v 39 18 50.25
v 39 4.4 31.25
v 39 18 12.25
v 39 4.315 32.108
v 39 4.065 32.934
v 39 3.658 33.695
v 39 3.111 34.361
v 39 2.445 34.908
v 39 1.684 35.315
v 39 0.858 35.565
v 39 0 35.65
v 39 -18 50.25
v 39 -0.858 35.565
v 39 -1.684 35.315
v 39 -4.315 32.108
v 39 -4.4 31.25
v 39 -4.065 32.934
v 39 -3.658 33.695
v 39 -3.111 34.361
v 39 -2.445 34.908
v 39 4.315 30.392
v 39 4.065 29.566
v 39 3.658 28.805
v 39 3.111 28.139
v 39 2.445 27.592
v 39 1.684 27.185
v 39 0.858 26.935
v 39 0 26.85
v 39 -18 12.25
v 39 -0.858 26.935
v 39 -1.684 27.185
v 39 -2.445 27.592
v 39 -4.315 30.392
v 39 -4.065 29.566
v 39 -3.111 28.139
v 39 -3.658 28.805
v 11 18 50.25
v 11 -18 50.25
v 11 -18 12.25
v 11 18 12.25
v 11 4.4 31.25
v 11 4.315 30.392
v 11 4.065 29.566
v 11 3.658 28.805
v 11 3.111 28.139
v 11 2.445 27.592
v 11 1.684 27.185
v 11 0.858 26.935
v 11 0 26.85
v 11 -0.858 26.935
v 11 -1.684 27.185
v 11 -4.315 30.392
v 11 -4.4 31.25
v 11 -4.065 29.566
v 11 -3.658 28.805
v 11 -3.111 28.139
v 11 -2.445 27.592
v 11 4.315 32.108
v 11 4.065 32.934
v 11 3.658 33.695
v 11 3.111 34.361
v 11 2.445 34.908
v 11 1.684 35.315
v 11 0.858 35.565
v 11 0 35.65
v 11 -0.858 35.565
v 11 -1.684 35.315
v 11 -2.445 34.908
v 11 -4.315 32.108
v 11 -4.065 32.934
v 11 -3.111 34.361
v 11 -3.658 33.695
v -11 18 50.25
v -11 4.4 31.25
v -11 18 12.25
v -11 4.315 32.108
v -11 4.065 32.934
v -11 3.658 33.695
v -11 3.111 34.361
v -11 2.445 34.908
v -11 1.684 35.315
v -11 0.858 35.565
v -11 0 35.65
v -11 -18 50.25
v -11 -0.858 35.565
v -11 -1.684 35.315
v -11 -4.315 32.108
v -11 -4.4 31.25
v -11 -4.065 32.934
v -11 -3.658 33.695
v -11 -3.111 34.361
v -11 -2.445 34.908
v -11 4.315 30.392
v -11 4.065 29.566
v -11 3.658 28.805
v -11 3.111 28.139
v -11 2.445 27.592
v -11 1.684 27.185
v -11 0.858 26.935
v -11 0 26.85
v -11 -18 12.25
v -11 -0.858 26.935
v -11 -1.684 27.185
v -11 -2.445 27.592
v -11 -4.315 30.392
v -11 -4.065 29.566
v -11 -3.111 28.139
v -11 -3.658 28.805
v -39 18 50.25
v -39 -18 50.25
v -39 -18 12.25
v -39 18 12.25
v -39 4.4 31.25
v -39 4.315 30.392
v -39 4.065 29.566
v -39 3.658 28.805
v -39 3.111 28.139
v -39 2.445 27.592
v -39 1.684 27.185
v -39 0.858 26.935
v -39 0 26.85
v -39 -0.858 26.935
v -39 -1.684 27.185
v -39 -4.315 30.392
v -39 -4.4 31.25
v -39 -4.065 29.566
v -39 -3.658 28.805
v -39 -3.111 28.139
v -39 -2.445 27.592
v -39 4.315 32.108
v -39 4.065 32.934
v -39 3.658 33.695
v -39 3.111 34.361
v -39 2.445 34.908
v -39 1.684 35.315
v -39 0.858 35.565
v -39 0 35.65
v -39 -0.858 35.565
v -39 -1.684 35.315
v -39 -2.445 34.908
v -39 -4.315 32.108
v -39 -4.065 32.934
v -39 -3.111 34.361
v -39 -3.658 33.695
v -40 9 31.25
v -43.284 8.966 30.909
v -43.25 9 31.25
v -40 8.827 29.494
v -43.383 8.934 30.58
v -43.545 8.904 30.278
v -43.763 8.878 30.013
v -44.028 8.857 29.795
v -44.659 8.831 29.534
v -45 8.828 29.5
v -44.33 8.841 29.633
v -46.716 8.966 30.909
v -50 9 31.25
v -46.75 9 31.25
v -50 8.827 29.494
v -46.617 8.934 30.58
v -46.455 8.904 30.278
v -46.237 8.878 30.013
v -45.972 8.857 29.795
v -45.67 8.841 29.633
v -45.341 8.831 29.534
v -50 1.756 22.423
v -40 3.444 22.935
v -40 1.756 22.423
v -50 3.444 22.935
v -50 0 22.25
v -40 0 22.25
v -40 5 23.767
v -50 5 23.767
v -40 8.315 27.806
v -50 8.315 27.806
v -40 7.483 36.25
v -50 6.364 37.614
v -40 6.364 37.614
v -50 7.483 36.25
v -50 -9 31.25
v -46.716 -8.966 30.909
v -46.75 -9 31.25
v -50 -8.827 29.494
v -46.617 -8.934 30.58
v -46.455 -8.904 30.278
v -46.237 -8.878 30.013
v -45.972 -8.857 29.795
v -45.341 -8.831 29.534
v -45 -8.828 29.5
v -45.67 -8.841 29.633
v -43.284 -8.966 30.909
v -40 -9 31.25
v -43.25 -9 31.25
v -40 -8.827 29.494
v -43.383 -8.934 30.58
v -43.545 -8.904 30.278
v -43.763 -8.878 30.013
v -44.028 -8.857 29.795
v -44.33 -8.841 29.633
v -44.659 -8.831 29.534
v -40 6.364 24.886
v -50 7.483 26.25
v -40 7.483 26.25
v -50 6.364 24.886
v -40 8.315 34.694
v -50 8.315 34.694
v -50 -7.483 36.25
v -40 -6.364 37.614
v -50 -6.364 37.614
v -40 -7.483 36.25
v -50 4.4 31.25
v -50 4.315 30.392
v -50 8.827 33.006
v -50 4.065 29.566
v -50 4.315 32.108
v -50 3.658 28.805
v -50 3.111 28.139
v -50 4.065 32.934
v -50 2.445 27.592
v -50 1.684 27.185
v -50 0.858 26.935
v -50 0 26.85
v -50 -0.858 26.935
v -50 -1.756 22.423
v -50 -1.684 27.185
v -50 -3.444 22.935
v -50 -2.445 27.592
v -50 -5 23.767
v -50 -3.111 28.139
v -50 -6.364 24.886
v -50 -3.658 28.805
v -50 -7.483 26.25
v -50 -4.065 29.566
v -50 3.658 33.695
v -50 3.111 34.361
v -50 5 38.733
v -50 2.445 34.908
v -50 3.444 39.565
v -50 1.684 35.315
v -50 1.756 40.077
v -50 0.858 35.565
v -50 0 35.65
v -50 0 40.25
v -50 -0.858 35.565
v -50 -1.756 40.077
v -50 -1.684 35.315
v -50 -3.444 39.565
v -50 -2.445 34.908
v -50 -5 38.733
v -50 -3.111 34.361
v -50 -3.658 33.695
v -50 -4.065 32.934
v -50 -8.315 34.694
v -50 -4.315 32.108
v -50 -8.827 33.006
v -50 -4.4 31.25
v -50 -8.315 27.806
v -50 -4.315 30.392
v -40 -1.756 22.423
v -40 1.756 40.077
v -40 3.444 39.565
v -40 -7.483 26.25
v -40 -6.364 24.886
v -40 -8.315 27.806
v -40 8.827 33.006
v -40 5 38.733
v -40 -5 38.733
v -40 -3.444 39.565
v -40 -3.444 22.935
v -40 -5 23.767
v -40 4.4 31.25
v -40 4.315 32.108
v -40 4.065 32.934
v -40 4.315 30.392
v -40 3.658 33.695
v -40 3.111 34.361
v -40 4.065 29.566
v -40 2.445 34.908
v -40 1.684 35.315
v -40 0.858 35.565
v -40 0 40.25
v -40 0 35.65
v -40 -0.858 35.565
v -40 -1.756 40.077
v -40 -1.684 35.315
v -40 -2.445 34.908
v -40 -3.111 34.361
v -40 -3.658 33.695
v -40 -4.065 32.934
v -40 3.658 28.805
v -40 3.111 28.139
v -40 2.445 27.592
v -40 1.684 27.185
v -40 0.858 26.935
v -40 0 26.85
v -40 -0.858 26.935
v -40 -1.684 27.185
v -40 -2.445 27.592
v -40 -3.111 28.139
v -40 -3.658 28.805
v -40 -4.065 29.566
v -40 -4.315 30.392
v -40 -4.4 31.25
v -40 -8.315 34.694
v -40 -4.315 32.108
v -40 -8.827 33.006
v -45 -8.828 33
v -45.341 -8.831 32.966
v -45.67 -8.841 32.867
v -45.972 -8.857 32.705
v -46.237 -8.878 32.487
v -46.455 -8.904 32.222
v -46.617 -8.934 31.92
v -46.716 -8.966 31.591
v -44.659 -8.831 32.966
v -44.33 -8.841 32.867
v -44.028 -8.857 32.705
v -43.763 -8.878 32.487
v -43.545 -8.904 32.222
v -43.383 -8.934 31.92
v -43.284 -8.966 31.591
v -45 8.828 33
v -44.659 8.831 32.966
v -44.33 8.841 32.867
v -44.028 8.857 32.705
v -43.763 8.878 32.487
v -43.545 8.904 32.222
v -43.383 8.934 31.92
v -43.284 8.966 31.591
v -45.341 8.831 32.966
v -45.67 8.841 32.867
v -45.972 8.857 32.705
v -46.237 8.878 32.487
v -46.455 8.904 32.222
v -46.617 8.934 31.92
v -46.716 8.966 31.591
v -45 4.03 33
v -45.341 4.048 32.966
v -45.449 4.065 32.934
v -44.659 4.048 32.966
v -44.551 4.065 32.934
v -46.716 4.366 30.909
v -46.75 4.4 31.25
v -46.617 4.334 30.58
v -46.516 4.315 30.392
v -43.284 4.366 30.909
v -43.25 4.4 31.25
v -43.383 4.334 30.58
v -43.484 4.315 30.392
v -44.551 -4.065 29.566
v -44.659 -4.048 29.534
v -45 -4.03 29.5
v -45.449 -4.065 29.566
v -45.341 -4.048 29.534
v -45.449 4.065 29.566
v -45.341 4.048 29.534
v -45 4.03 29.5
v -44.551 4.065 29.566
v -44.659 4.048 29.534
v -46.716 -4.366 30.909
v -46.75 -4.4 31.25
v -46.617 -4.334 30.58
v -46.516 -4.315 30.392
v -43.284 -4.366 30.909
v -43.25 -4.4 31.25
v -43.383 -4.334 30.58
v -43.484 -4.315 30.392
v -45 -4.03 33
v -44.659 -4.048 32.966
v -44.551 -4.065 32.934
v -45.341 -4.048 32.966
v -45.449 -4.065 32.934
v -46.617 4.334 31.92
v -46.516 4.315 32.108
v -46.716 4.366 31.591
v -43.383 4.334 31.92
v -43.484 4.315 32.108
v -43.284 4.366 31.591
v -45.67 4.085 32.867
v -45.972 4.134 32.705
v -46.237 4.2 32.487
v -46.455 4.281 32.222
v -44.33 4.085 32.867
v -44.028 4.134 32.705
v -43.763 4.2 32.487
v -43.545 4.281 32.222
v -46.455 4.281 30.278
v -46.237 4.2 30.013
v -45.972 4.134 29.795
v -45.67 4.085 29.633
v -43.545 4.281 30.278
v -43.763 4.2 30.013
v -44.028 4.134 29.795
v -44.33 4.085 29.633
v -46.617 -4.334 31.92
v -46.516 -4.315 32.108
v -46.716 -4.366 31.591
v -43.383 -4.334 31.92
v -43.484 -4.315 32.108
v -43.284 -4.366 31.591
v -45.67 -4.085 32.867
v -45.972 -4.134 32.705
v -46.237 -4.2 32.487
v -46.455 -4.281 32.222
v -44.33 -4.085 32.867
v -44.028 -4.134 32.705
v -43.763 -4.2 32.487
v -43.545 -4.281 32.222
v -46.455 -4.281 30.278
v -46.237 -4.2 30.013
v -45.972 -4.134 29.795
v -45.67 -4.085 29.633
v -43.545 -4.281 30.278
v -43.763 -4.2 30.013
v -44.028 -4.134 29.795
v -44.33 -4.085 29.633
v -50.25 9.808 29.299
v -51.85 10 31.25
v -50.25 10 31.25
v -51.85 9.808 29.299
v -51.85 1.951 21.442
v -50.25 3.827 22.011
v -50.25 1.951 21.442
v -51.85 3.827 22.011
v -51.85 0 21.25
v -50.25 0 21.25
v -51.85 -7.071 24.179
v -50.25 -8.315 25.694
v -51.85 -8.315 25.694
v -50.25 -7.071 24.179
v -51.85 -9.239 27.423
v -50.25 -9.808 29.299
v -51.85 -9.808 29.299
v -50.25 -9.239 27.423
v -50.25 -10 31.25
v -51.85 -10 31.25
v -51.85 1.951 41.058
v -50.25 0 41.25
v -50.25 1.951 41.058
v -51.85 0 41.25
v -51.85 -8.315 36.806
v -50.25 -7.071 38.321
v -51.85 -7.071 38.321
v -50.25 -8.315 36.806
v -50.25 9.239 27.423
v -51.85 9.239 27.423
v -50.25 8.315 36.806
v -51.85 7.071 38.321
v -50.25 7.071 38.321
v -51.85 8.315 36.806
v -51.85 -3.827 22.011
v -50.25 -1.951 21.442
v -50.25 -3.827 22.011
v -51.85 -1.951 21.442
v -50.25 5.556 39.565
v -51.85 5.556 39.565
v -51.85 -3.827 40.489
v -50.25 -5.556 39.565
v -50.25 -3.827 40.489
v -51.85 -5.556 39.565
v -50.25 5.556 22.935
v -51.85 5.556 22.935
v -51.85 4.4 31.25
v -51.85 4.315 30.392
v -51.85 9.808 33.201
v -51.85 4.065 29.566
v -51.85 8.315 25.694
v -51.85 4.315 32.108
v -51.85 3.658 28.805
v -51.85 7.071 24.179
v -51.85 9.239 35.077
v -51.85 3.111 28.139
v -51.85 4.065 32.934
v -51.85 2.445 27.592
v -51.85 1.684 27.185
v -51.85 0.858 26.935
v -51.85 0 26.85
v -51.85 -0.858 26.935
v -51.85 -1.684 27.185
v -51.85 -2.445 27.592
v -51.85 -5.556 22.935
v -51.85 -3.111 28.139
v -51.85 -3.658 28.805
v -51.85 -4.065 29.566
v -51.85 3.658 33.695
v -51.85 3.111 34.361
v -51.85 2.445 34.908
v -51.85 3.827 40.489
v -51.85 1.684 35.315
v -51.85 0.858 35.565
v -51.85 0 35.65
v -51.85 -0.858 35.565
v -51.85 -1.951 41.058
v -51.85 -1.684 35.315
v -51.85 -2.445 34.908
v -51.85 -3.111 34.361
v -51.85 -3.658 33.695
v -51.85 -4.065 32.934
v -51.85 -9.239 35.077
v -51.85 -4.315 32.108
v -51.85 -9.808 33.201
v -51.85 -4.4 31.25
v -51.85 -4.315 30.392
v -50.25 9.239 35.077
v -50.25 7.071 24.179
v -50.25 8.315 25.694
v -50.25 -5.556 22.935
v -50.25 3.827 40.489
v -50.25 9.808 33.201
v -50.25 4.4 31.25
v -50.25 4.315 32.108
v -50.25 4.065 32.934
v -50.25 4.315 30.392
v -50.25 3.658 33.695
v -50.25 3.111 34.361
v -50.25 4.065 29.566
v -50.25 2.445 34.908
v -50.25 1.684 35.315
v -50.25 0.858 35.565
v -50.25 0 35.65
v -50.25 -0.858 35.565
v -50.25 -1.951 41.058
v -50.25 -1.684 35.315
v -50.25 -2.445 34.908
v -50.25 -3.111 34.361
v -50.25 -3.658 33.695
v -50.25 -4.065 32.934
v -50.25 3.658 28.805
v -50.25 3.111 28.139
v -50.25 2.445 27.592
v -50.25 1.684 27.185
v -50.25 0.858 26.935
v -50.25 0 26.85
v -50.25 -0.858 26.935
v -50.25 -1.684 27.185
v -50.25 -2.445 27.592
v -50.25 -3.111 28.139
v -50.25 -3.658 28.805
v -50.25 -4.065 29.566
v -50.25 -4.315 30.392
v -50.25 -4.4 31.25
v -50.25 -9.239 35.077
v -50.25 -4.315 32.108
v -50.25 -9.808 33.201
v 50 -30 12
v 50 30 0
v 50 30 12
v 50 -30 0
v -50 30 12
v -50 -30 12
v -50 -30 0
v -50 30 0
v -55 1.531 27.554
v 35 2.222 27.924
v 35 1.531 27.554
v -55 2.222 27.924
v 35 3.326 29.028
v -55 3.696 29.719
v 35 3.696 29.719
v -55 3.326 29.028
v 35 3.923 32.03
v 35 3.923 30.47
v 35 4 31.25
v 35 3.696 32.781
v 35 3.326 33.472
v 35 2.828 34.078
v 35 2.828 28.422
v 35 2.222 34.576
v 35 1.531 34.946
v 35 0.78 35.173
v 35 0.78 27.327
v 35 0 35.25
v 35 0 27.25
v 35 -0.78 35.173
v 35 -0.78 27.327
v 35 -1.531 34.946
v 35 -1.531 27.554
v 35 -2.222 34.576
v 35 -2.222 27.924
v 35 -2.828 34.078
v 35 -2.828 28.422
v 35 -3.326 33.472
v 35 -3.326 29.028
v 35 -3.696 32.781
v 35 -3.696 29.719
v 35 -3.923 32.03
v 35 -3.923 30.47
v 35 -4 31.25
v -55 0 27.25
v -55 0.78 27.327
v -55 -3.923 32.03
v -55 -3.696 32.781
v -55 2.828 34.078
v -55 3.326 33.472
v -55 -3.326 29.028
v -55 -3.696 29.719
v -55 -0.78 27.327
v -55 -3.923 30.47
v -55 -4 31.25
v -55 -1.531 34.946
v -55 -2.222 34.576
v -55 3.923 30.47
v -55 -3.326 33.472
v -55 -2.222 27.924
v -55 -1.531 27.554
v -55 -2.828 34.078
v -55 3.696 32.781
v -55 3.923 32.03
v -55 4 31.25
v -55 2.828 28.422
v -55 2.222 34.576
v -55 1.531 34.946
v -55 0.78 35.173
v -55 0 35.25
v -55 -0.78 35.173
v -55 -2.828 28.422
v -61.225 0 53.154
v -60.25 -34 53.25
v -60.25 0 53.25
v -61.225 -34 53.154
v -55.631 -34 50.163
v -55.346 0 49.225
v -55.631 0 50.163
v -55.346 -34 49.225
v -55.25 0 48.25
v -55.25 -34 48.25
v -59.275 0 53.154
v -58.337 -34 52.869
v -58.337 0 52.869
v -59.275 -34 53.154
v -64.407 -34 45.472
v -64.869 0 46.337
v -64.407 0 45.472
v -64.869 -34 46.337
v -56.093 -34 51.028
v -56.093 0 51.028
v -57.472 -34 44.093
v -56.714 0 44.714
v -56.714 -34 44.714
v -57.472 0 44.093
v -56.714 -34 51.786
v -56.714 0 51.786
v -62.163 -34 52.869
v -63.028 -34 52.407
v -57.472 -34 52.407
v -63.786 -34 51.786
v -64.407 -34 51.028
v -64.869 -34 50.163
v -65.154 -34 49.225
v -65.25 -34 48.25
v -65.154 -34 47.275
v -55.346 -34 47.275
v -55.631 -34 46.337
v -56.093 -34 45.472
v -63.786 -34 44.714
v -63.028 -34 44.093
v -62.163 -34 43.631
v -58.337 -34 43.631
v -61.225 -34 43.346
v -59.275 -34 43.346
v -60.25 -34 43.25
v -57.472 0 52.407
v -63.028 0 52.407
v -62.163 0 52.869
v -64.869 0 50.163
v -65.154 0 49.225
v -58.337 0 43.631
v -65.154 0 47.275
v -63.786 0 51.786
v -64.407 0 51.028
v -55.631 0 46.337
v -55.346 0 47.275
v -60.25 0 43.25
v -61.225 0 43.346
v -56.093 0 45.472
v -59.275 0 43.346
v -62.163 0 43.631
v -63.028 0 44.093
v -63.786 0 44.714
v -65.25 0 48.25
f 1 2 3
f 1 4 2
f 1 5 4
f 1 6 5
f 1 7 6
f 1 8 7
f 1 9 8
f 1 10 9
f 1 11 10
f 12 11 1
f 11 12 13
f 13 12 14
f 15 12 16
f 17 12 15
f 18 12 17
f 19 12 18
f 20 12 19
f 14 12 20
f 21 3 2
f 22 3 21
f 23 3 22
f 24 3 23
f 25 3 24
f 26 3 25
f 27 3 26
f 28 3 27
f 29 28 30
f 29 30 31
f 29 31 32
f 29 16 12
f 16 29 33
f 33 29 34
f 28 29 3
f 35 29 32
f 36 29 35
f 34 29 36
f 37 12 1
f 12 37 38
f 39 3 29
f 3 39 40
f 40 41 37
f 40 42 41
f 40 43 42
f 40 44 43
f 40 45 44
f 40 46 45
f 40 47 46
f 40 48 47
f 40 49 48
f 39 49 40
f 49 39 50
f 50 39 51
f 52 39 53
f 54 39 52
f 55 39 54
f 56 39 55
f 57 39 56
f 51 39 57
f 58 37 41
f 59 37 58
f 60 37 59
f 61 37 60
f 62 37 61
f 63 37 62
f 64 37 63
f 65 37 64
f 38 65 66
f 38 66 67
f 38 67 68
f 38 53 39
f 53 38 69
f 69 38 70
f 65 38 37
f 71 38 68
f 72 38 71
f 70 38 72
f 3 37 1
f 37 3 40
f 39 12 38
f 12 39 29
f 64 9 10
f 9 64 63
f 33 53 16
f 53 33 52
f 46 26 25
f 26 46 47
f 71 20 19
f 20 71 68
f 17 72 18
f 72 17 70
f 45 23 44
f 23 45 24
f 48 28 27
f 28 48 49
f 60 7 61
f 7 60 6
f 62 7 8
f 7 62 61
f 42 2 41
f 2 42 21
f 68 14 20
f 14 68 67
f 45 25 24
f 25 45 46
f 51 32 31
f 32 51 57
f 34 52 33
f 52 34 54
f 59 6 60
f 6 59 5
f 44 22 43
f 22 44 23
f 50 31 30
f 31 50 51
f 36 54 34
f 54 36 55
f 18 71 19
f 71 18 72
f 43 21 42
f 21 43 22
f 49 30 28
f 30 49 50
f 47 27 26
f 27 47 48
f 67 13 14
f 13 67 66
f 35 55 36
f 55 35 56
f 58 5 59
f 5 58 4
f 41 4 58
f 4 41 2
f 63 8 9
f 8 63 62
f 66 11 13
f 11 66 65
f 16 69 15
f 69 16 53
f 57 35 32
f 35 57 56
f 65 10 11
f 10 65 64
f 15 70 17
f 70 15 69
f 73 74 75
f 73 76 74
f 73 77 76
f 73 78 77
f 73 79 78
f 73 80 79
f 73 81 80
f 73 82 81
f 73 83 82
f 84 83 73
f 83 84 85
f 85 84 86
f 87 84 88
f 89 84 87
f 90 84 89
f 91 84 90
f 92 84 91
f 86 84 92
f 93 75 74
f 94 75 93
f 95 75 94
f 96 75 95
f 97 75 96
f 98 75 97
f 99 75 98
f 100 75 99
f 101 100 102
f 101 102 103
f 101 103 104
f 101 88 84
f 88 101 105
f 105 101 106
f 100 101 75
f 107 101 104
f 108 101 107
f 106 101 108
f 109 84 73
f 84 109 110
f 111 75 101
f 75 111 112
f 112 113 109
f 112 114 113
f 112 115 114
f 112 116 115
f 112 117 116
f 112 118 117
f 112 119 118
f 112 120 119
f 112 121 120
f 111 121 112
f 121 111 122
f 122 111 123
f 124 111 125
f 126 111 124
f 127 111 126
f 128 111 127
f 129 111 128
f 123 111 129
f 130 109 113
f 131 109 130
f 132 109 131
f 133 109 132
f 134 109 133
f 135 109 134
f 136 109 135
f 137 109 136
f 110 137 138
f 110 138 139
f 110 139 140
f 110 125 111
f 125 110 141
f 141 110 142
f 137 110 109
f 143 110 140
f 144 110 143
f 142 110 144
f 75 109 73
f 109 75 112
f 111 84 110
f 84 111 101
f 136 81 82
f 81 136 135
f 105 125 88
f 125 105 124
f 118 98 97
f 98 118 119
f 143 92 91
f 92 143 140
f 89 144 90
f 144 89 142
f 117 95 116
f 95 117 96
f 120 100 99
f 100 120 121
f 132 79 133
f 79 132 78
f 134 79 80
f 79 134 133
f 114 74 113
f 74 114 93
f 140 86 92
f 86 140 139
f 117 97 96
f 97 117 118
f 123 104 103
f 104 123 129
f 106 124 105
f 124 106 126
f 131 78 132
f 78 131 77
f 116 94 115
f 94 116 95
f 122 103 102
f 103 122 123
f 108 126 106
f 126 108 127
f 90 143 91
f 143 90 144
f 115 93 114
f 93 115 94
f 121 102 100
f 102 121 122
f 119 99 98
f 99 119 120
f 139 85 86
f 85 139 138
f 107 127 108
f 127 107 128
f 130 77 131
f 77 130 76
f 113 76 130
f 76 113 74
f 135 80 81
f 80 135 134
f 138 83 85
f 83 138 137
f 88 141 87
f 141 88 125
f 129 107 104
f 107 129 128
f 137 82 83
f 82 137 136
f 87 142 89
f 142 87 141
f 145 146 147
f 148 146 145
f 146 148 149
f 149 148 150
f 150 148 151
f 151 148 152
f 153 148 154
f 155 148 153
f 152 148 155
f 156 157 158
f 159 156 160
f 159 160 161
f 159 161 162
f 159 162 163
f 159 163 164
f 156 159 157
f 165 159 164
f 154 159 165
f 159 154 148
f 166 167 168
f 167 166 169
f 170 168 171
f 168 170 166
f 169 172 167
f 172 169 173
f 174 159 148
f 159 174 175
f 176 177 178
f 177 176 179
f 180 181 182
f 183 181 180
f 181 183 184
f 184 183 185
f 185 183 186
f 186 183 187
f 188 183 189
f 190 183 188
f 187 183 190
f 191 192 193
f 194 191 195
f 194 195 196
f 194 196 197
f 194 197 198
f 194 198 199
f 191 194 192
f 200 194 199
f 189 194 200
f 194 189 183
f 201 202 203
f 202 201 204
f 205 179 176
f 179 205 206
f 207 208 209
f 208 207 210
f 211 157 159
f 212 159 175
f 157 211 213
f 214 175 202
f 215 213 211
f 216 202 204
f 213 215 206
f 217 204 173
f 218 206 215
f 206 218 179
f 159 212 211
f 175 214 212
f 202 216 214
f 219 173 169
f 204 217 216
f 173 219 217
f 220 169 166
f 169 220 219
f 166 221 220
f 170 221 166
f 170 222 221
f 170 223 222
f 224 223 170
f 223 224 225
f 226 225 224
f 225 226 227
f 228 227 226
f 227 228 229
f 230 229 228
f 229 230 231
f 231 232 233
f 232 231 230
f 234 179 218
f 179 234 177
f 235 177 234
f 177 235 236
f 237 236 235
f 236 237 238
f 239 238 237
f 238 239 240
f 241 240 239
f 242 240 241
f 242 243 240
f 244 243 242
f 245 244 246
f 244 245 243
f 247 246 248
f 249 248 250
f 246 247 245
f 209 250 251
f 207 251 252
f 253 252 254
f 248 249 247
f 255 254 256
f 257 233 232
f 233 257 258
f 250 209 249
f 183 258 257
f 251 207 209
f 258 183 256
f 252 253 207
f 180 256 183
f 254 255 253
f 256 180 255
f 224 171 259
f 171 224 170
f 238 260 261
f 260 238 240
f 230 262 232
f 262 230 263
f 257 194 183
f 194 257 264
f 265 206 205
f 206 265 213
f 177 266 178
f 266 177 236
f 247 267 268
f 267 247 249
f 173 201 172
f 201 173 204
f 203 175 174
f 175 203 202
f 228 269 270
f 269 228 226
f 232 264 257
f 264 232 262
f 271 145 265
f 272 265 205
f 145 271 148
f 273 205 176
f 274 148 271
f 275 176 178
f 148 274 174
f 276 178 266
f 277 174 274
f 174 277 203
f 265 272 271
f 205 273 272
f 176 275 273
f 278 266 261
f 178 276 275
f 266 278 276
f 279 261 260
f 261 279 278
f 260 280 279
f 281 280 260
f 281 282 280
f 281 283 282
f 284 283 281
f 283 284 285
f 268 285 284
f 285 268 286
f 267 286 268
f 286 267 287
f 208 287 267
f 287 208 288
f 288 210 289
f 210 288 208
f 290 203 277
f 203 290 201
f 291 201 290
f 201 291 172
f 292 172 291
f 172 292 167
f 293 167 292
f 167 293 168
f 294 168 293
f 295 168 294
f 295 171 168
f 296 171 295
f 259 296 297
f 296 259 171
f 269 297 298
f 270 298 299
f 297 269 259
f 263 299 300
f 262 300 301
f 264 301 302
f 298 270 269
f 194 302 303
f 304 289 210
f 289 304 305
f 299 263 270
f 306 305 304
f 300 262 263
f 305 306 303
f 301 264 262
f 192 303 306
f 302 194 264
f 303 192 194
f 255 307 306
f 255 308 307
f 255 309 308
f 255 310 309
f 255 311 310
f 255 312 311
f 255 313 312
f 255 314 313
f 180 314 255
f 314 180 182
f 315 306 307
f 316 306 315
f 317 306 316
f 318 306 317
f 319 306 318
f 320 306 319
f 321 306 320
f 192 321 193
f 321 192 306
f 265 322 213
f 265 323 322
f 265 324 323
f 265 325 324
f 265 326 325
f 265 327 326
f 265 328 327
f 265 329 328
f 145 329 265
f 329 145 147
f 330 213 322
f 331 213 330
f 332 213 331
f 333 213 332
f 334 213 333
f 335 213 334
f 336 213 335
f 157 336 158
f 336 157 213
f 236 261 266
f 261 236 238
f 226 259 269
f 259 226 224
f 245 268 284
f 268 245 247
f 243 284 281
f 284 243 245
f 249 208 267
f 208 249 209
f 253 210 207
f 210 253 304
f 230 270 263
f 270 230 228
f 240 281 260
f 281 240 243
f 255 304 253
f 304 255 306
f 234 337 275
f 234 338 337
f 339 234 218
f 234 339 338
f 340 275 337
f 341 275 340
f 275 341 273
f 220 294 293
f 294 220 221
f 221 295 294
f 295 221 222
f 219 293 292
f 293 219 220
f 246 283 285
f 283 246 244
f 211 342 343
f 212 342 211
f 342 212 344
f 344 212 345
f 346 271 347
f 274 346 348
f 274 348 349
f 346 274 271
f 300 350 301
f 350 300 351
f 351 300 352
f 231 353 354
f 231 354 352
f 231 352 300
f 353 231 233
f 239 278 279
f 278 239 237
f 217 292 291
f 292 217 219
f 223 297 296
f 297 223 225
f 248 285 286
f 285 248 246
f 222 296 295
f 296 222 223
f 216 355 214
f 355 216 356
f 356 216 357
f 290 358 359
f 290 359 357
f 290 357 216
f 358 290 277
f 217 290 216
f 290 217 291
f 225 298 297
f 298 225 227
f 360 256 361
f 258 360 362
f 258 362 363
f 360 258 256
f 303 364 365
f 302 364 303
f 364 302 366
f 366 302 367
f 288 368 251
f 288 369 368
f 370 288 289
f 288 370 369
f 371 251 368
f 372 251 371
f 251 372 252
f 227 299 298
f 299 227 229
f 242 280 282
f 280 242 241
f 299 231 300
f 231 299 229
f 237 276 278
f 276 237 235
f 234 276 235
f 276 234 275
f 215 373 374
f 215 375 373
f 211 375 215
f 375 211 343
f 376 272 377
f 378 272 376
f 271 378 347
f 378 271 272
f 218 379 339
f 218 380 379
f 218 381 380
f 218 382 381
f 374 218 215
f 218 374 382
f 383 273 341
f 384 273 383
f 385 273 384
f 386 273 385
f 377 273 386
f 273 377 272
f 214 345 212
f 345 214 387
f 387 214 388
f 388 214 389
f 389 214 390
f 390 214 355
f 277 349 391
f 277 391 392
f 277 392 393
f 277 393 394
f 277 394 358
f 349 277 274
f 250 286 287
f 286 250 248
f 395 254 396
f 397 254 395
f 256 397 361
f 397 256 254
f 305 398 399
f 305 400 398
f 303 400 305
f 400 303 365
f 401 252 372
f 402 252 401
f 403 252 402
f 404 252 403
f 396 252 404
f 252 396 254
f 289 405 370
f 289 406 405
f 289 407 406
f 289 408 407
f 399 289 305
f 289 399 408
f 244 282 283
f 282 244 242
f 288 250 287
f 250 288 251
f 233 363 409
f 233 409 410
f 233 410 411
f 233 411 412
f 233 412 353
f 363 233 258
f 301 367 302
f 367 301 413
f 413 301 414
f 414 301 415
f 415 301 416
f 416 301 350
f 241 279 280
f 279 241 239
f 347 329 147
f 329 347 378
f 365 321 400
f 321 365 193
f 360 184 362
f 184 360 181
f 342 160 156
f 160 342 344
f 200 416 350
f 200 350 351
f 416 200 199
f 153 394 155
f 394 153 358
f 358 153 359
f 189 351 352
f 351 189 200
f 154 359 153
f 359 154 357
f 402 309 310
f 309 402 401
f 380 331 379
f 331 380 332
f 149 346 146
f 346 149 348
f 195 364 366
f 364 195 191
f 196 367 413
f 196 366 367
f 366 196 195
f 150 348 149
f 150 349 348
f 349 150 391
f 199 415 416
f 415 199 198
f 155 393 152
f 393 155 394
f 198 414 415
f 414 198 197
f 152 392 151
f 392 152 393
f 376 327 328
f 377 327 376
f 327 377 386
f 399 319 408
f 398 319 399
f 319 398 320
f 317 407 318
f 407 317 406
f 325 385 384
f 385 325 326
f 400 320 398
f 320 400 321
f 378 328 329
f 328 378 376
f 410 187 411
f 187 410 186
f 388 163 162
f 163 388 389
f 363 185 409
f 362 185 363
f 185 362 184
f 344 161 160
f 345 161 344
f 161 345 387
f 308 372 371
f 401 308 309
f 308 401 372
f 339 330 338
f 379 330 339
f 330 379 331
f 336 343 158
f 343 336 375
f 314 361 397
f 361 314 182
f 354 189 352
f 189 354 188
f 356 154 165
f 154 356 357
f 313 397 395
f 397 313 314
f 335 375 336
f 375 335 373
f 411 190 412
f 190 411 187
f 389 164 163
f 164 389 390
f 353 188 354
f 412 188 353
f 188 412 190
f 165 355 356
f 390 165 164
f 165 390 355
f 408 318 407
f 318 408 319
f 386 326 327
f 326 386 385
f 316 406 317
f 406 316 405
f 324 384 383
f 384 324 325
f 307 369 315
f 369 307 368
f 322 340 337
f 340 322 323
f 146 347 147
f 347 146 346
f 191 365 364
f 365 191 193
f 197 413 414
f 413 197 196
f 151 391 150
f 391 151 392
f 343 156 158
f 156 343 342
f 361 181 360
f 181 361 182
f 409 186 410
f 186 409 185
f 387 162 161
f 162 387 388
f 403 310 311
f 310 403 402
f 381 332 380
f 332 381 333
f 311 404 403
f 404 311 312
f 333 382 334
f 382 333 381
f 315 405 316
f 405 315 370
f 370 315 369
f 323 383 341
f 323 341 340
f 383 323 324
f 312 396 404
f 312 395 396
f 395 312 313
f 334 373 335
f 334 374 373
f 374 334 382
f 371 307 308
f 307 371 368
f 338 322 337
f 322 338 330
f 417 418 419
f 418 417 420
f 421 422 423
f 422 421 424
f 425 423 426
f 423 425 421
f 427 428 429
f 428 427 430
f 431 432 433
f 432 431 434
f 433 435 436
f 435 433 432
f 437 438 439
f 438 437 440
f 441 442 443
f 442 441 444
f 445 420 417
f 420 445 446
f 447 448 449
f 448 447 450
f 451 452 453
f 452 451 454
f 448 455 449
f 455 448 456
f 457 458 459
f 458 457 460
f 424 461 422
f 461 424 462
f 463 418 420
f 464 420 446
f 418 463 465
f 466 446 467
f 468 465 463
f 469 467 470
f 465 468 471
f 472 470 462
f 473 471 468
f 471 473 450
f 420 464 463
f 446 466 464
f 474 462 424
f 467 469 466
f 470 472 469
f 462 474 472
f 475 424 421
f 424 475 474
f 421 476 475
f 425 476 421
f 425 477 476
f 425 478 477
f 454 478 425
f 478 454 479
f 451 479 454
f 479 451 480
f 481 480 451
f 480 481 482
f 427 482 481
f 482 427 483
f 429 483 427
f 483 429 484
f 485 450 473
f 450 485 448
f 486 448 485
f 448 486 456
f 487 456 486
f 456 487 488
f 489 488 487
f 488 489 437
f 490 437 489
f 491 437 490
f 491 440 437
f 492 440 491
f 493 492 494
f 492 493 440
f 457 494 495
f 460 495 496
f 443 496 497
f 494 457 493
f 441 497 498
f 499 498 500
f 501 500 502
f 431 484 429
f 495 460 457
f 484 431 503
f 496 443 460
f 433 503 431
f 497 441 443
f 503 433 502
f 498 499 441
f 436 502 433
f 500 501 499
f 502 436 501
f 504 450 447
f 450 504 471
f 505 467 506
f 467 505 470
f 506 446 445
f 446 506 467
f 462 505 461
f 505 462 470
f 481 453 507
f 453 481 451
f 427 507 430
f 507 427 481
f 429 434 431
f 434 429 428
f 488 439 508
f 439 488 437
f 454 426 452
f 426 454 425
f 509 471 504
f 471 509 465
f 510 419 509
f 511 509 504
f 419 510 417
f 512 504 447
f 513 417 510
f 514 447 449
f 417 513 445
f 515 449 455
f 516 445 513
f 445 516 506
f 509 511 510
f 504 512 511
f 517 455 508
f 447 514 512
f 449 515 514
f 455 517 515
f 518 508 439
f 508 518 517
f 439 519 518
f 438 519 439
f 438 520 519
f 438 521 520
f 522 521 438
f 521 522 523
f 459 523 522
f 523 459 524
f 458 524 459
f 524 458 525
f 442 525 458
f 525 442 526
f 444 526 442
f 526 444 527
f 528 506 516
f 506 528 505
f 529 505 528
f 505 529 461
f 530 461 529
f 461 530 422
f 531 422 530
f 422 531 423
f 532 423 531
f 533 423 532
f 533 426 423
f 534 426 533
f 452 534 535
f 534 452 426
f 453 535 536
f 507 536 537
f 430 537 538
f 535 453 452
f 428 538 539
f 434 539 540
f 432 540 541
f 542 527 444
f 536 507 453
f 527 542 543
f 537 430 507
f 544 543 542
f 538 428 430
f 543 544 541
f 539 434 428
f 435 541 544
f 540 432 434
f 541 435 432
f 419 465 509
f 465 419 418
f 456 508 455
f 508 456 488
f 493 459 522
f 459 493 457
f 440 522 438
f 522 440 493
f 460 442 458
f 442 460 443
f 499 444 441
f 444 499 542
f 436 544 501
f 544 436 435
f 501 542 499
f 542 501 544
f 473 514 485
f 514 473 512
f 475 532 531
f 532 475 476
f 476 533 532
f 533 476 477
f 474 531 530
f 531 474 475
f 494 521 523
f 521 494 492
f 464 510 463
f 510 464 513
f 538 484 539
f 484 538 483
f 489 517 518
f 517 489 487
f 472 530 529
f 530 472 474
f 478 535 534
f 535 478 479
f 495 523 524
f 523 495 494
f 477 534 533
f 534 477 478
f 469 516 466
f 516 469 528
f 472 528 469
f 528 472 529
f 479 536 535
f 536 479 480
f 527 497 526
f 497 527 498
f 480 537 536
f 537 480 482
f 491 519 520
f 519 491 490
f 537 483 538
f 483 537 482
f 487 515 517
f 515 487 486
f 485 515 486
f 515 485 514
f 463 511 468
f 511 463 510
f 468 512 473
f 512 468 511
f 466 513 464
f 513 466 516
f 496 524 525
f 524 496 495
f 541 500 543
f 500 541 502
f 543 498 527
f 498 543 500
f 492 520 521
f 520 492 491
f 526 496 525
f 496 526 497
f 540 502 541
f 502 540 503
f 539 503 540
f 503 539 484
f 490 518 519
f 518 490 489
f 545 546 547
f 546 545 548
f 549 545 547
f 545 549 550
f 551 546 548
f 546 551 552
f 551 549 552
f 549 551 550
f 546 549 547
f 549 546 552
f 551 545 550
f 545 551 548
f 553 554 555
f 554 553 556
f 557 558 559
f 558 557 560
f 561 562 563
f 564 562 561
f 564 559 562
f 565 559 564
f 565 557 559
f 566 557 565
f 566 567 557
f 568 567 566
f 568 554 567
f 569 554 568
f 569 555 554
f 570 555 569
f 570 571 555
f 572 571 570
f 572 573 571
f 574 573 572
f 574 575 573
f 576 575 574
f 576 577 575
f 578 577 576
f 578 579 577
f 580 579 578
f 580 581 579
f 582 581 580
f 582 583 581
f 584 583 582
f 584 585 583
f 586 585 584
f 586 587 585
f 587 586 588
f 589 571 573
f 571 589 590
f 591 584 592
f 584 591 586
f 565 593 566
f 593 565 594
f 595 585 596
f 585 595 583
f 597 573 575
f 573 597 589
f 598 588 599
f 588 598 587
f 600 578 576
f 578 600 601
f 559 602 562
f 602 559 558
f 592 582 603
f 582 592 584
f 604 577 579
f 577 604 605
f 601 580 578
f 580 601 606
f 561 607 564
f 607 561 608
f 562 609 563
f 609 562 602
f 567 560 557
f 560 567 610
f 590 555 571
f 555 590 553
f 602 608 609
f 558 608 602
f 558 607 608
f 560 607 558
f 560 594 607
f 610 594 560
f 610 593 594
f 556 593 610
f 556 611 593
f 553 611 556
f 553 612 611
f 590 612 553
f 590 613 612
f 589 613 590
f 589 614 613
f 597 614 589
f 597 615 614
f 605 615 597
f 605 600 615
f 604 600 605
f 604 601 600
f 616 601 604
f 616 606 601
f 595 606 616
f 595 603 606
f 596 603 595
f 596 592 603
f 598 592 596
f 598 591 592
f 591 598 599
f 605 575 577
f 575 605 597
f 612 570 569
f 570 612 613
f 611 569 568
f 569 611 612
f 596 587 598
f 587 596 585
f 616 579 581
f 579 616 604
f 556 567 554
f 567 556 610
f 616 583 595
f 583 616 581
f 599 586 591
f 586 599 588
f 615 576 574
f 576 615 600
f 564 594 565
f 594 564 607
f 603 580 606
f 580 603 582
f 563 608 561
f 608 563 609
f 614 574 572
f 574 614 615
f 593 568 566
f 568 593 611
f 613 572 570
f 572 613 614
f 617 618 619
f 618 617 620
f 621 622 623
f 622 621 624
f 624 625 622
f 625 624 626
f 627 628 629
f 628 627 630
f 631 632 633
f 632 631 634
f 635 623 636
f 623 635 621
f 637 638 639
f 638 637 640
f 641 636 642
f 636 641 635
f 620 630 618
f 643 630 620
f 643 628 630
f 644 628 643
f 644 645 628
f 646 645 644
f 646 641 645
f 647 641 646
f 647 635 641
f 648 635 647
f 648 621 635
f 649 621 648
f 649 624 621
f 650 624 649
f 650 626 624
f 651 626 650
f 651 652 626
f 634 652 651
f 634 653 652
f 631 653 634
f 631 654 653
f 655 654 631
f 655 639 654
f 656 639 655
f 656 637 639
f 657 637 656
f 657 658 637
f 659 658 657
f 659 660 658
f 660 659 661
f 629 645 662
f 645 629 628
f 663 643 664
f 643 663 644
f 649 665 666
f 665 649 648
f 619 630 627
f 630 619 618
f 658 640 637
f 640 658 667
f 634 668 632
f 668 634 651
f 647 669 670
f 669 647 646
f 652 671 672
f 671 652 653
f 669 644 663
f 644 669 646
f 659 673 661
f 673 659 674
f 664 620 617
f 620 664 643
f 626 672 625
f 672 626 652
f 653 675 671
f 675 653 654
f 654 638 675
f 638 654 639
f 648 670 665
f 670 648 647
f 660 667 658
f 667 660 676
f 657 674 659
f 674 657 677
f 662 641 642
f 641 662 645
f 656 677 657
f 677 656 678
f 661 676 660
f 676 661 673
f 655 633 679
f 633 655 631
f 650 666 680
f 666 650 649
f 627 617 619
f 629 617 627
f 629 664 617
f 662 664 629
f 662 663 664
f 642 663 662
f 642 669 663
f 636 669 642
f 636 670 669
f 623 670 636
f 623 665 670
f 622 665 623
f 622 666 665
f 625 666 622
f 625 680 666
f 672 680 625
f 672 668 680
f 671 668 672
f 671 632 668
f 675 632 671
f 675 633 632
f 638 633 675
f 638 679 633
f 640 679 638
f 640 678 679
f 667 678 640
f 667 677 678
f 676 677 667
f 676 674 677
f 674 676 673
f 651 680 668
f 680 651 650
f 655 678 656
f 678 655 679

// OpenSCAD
$fn = 32;

// ------------------------------------------------------------------------
// Machine vise: screw d8, jaws 28 x 38 mm
// Every part is its own module, assembly() places every instance.
// ------------------------------------------------------------------------

// --- part 1 ---
module vise_bed() {
  difference() {
    translate([-50, -30, 0]) cube([100, 60, 12]);
  }
}

// --- part 2 ---
module vise_jaw() {
  difference() {
    translate([-14, -18, 0]) cube([28, 36, 38]);
    translate([0, 0, 19]) rotate([0, 90, 0]) cylinder(h = 30, d = 8.8, center = true);
  }
}

// --- part 3 ---
module vise_screw() {
  translate([0, 0, -45]) cylinder(h = 90, d = 8);
}

// --- part 4 ---
module screw_collar() {
  difference() {
    cylinder(h = 10, d = 18);
    translate([0, 0, -1]) cylinder(h = 12, d = 8.8);
    translate([0, 0, 5]) rotate([90, 0, 0]) cylinder(h = 20, d = 3.5, center = true);
  }
}

// --- part 5 ---
module screw_washer() {
  difference() {
      translate([0, 0, 0]) cylinder(h = 1.6, d = 20);
      translate([0, 0, -1]) cylinder(h = 3.6, d = 8.8);
    }
}

// --- part 6 ---
module vise_handle() {
  cylinder(h = 34, d = 10);
}

// --- assembly ---
module assembly() {
  color([0.80, 0.24, 0.20]) translate([0, 0, 0]) rotate([0, 0, 0]) vise_bed();
  color([0.20, 0.45, 0.75]) translate([25, 0, 12.25]) rotate([0, 0, 0]) vise_jaw();
  color([0.25, 0.62, 0.32]) translate([-25, 0, 12.25]) rotate([0, 0, 0]) vise_jaw();
  color([0.92, 0.70, 0.18]) translate([-10, 0, 31.25]) rotate([0, 90, 0]) vise_screw();
  color([0.58, 0.35, 0.70]) translate([-50, 0, 31.25]) rotate([0, 90, 0]) screw_collar();
  color([0.16, 0.66, 0.66]) translate([-51.85, 0, 31.25]) rotate([0, 90, 0]) screw_washer();
  color([0.85, 0.48, 0.18]) translate([-60.25, 0, 48.25]) rotate([90, 0, 0]) vise_handle();
}

assembly();
